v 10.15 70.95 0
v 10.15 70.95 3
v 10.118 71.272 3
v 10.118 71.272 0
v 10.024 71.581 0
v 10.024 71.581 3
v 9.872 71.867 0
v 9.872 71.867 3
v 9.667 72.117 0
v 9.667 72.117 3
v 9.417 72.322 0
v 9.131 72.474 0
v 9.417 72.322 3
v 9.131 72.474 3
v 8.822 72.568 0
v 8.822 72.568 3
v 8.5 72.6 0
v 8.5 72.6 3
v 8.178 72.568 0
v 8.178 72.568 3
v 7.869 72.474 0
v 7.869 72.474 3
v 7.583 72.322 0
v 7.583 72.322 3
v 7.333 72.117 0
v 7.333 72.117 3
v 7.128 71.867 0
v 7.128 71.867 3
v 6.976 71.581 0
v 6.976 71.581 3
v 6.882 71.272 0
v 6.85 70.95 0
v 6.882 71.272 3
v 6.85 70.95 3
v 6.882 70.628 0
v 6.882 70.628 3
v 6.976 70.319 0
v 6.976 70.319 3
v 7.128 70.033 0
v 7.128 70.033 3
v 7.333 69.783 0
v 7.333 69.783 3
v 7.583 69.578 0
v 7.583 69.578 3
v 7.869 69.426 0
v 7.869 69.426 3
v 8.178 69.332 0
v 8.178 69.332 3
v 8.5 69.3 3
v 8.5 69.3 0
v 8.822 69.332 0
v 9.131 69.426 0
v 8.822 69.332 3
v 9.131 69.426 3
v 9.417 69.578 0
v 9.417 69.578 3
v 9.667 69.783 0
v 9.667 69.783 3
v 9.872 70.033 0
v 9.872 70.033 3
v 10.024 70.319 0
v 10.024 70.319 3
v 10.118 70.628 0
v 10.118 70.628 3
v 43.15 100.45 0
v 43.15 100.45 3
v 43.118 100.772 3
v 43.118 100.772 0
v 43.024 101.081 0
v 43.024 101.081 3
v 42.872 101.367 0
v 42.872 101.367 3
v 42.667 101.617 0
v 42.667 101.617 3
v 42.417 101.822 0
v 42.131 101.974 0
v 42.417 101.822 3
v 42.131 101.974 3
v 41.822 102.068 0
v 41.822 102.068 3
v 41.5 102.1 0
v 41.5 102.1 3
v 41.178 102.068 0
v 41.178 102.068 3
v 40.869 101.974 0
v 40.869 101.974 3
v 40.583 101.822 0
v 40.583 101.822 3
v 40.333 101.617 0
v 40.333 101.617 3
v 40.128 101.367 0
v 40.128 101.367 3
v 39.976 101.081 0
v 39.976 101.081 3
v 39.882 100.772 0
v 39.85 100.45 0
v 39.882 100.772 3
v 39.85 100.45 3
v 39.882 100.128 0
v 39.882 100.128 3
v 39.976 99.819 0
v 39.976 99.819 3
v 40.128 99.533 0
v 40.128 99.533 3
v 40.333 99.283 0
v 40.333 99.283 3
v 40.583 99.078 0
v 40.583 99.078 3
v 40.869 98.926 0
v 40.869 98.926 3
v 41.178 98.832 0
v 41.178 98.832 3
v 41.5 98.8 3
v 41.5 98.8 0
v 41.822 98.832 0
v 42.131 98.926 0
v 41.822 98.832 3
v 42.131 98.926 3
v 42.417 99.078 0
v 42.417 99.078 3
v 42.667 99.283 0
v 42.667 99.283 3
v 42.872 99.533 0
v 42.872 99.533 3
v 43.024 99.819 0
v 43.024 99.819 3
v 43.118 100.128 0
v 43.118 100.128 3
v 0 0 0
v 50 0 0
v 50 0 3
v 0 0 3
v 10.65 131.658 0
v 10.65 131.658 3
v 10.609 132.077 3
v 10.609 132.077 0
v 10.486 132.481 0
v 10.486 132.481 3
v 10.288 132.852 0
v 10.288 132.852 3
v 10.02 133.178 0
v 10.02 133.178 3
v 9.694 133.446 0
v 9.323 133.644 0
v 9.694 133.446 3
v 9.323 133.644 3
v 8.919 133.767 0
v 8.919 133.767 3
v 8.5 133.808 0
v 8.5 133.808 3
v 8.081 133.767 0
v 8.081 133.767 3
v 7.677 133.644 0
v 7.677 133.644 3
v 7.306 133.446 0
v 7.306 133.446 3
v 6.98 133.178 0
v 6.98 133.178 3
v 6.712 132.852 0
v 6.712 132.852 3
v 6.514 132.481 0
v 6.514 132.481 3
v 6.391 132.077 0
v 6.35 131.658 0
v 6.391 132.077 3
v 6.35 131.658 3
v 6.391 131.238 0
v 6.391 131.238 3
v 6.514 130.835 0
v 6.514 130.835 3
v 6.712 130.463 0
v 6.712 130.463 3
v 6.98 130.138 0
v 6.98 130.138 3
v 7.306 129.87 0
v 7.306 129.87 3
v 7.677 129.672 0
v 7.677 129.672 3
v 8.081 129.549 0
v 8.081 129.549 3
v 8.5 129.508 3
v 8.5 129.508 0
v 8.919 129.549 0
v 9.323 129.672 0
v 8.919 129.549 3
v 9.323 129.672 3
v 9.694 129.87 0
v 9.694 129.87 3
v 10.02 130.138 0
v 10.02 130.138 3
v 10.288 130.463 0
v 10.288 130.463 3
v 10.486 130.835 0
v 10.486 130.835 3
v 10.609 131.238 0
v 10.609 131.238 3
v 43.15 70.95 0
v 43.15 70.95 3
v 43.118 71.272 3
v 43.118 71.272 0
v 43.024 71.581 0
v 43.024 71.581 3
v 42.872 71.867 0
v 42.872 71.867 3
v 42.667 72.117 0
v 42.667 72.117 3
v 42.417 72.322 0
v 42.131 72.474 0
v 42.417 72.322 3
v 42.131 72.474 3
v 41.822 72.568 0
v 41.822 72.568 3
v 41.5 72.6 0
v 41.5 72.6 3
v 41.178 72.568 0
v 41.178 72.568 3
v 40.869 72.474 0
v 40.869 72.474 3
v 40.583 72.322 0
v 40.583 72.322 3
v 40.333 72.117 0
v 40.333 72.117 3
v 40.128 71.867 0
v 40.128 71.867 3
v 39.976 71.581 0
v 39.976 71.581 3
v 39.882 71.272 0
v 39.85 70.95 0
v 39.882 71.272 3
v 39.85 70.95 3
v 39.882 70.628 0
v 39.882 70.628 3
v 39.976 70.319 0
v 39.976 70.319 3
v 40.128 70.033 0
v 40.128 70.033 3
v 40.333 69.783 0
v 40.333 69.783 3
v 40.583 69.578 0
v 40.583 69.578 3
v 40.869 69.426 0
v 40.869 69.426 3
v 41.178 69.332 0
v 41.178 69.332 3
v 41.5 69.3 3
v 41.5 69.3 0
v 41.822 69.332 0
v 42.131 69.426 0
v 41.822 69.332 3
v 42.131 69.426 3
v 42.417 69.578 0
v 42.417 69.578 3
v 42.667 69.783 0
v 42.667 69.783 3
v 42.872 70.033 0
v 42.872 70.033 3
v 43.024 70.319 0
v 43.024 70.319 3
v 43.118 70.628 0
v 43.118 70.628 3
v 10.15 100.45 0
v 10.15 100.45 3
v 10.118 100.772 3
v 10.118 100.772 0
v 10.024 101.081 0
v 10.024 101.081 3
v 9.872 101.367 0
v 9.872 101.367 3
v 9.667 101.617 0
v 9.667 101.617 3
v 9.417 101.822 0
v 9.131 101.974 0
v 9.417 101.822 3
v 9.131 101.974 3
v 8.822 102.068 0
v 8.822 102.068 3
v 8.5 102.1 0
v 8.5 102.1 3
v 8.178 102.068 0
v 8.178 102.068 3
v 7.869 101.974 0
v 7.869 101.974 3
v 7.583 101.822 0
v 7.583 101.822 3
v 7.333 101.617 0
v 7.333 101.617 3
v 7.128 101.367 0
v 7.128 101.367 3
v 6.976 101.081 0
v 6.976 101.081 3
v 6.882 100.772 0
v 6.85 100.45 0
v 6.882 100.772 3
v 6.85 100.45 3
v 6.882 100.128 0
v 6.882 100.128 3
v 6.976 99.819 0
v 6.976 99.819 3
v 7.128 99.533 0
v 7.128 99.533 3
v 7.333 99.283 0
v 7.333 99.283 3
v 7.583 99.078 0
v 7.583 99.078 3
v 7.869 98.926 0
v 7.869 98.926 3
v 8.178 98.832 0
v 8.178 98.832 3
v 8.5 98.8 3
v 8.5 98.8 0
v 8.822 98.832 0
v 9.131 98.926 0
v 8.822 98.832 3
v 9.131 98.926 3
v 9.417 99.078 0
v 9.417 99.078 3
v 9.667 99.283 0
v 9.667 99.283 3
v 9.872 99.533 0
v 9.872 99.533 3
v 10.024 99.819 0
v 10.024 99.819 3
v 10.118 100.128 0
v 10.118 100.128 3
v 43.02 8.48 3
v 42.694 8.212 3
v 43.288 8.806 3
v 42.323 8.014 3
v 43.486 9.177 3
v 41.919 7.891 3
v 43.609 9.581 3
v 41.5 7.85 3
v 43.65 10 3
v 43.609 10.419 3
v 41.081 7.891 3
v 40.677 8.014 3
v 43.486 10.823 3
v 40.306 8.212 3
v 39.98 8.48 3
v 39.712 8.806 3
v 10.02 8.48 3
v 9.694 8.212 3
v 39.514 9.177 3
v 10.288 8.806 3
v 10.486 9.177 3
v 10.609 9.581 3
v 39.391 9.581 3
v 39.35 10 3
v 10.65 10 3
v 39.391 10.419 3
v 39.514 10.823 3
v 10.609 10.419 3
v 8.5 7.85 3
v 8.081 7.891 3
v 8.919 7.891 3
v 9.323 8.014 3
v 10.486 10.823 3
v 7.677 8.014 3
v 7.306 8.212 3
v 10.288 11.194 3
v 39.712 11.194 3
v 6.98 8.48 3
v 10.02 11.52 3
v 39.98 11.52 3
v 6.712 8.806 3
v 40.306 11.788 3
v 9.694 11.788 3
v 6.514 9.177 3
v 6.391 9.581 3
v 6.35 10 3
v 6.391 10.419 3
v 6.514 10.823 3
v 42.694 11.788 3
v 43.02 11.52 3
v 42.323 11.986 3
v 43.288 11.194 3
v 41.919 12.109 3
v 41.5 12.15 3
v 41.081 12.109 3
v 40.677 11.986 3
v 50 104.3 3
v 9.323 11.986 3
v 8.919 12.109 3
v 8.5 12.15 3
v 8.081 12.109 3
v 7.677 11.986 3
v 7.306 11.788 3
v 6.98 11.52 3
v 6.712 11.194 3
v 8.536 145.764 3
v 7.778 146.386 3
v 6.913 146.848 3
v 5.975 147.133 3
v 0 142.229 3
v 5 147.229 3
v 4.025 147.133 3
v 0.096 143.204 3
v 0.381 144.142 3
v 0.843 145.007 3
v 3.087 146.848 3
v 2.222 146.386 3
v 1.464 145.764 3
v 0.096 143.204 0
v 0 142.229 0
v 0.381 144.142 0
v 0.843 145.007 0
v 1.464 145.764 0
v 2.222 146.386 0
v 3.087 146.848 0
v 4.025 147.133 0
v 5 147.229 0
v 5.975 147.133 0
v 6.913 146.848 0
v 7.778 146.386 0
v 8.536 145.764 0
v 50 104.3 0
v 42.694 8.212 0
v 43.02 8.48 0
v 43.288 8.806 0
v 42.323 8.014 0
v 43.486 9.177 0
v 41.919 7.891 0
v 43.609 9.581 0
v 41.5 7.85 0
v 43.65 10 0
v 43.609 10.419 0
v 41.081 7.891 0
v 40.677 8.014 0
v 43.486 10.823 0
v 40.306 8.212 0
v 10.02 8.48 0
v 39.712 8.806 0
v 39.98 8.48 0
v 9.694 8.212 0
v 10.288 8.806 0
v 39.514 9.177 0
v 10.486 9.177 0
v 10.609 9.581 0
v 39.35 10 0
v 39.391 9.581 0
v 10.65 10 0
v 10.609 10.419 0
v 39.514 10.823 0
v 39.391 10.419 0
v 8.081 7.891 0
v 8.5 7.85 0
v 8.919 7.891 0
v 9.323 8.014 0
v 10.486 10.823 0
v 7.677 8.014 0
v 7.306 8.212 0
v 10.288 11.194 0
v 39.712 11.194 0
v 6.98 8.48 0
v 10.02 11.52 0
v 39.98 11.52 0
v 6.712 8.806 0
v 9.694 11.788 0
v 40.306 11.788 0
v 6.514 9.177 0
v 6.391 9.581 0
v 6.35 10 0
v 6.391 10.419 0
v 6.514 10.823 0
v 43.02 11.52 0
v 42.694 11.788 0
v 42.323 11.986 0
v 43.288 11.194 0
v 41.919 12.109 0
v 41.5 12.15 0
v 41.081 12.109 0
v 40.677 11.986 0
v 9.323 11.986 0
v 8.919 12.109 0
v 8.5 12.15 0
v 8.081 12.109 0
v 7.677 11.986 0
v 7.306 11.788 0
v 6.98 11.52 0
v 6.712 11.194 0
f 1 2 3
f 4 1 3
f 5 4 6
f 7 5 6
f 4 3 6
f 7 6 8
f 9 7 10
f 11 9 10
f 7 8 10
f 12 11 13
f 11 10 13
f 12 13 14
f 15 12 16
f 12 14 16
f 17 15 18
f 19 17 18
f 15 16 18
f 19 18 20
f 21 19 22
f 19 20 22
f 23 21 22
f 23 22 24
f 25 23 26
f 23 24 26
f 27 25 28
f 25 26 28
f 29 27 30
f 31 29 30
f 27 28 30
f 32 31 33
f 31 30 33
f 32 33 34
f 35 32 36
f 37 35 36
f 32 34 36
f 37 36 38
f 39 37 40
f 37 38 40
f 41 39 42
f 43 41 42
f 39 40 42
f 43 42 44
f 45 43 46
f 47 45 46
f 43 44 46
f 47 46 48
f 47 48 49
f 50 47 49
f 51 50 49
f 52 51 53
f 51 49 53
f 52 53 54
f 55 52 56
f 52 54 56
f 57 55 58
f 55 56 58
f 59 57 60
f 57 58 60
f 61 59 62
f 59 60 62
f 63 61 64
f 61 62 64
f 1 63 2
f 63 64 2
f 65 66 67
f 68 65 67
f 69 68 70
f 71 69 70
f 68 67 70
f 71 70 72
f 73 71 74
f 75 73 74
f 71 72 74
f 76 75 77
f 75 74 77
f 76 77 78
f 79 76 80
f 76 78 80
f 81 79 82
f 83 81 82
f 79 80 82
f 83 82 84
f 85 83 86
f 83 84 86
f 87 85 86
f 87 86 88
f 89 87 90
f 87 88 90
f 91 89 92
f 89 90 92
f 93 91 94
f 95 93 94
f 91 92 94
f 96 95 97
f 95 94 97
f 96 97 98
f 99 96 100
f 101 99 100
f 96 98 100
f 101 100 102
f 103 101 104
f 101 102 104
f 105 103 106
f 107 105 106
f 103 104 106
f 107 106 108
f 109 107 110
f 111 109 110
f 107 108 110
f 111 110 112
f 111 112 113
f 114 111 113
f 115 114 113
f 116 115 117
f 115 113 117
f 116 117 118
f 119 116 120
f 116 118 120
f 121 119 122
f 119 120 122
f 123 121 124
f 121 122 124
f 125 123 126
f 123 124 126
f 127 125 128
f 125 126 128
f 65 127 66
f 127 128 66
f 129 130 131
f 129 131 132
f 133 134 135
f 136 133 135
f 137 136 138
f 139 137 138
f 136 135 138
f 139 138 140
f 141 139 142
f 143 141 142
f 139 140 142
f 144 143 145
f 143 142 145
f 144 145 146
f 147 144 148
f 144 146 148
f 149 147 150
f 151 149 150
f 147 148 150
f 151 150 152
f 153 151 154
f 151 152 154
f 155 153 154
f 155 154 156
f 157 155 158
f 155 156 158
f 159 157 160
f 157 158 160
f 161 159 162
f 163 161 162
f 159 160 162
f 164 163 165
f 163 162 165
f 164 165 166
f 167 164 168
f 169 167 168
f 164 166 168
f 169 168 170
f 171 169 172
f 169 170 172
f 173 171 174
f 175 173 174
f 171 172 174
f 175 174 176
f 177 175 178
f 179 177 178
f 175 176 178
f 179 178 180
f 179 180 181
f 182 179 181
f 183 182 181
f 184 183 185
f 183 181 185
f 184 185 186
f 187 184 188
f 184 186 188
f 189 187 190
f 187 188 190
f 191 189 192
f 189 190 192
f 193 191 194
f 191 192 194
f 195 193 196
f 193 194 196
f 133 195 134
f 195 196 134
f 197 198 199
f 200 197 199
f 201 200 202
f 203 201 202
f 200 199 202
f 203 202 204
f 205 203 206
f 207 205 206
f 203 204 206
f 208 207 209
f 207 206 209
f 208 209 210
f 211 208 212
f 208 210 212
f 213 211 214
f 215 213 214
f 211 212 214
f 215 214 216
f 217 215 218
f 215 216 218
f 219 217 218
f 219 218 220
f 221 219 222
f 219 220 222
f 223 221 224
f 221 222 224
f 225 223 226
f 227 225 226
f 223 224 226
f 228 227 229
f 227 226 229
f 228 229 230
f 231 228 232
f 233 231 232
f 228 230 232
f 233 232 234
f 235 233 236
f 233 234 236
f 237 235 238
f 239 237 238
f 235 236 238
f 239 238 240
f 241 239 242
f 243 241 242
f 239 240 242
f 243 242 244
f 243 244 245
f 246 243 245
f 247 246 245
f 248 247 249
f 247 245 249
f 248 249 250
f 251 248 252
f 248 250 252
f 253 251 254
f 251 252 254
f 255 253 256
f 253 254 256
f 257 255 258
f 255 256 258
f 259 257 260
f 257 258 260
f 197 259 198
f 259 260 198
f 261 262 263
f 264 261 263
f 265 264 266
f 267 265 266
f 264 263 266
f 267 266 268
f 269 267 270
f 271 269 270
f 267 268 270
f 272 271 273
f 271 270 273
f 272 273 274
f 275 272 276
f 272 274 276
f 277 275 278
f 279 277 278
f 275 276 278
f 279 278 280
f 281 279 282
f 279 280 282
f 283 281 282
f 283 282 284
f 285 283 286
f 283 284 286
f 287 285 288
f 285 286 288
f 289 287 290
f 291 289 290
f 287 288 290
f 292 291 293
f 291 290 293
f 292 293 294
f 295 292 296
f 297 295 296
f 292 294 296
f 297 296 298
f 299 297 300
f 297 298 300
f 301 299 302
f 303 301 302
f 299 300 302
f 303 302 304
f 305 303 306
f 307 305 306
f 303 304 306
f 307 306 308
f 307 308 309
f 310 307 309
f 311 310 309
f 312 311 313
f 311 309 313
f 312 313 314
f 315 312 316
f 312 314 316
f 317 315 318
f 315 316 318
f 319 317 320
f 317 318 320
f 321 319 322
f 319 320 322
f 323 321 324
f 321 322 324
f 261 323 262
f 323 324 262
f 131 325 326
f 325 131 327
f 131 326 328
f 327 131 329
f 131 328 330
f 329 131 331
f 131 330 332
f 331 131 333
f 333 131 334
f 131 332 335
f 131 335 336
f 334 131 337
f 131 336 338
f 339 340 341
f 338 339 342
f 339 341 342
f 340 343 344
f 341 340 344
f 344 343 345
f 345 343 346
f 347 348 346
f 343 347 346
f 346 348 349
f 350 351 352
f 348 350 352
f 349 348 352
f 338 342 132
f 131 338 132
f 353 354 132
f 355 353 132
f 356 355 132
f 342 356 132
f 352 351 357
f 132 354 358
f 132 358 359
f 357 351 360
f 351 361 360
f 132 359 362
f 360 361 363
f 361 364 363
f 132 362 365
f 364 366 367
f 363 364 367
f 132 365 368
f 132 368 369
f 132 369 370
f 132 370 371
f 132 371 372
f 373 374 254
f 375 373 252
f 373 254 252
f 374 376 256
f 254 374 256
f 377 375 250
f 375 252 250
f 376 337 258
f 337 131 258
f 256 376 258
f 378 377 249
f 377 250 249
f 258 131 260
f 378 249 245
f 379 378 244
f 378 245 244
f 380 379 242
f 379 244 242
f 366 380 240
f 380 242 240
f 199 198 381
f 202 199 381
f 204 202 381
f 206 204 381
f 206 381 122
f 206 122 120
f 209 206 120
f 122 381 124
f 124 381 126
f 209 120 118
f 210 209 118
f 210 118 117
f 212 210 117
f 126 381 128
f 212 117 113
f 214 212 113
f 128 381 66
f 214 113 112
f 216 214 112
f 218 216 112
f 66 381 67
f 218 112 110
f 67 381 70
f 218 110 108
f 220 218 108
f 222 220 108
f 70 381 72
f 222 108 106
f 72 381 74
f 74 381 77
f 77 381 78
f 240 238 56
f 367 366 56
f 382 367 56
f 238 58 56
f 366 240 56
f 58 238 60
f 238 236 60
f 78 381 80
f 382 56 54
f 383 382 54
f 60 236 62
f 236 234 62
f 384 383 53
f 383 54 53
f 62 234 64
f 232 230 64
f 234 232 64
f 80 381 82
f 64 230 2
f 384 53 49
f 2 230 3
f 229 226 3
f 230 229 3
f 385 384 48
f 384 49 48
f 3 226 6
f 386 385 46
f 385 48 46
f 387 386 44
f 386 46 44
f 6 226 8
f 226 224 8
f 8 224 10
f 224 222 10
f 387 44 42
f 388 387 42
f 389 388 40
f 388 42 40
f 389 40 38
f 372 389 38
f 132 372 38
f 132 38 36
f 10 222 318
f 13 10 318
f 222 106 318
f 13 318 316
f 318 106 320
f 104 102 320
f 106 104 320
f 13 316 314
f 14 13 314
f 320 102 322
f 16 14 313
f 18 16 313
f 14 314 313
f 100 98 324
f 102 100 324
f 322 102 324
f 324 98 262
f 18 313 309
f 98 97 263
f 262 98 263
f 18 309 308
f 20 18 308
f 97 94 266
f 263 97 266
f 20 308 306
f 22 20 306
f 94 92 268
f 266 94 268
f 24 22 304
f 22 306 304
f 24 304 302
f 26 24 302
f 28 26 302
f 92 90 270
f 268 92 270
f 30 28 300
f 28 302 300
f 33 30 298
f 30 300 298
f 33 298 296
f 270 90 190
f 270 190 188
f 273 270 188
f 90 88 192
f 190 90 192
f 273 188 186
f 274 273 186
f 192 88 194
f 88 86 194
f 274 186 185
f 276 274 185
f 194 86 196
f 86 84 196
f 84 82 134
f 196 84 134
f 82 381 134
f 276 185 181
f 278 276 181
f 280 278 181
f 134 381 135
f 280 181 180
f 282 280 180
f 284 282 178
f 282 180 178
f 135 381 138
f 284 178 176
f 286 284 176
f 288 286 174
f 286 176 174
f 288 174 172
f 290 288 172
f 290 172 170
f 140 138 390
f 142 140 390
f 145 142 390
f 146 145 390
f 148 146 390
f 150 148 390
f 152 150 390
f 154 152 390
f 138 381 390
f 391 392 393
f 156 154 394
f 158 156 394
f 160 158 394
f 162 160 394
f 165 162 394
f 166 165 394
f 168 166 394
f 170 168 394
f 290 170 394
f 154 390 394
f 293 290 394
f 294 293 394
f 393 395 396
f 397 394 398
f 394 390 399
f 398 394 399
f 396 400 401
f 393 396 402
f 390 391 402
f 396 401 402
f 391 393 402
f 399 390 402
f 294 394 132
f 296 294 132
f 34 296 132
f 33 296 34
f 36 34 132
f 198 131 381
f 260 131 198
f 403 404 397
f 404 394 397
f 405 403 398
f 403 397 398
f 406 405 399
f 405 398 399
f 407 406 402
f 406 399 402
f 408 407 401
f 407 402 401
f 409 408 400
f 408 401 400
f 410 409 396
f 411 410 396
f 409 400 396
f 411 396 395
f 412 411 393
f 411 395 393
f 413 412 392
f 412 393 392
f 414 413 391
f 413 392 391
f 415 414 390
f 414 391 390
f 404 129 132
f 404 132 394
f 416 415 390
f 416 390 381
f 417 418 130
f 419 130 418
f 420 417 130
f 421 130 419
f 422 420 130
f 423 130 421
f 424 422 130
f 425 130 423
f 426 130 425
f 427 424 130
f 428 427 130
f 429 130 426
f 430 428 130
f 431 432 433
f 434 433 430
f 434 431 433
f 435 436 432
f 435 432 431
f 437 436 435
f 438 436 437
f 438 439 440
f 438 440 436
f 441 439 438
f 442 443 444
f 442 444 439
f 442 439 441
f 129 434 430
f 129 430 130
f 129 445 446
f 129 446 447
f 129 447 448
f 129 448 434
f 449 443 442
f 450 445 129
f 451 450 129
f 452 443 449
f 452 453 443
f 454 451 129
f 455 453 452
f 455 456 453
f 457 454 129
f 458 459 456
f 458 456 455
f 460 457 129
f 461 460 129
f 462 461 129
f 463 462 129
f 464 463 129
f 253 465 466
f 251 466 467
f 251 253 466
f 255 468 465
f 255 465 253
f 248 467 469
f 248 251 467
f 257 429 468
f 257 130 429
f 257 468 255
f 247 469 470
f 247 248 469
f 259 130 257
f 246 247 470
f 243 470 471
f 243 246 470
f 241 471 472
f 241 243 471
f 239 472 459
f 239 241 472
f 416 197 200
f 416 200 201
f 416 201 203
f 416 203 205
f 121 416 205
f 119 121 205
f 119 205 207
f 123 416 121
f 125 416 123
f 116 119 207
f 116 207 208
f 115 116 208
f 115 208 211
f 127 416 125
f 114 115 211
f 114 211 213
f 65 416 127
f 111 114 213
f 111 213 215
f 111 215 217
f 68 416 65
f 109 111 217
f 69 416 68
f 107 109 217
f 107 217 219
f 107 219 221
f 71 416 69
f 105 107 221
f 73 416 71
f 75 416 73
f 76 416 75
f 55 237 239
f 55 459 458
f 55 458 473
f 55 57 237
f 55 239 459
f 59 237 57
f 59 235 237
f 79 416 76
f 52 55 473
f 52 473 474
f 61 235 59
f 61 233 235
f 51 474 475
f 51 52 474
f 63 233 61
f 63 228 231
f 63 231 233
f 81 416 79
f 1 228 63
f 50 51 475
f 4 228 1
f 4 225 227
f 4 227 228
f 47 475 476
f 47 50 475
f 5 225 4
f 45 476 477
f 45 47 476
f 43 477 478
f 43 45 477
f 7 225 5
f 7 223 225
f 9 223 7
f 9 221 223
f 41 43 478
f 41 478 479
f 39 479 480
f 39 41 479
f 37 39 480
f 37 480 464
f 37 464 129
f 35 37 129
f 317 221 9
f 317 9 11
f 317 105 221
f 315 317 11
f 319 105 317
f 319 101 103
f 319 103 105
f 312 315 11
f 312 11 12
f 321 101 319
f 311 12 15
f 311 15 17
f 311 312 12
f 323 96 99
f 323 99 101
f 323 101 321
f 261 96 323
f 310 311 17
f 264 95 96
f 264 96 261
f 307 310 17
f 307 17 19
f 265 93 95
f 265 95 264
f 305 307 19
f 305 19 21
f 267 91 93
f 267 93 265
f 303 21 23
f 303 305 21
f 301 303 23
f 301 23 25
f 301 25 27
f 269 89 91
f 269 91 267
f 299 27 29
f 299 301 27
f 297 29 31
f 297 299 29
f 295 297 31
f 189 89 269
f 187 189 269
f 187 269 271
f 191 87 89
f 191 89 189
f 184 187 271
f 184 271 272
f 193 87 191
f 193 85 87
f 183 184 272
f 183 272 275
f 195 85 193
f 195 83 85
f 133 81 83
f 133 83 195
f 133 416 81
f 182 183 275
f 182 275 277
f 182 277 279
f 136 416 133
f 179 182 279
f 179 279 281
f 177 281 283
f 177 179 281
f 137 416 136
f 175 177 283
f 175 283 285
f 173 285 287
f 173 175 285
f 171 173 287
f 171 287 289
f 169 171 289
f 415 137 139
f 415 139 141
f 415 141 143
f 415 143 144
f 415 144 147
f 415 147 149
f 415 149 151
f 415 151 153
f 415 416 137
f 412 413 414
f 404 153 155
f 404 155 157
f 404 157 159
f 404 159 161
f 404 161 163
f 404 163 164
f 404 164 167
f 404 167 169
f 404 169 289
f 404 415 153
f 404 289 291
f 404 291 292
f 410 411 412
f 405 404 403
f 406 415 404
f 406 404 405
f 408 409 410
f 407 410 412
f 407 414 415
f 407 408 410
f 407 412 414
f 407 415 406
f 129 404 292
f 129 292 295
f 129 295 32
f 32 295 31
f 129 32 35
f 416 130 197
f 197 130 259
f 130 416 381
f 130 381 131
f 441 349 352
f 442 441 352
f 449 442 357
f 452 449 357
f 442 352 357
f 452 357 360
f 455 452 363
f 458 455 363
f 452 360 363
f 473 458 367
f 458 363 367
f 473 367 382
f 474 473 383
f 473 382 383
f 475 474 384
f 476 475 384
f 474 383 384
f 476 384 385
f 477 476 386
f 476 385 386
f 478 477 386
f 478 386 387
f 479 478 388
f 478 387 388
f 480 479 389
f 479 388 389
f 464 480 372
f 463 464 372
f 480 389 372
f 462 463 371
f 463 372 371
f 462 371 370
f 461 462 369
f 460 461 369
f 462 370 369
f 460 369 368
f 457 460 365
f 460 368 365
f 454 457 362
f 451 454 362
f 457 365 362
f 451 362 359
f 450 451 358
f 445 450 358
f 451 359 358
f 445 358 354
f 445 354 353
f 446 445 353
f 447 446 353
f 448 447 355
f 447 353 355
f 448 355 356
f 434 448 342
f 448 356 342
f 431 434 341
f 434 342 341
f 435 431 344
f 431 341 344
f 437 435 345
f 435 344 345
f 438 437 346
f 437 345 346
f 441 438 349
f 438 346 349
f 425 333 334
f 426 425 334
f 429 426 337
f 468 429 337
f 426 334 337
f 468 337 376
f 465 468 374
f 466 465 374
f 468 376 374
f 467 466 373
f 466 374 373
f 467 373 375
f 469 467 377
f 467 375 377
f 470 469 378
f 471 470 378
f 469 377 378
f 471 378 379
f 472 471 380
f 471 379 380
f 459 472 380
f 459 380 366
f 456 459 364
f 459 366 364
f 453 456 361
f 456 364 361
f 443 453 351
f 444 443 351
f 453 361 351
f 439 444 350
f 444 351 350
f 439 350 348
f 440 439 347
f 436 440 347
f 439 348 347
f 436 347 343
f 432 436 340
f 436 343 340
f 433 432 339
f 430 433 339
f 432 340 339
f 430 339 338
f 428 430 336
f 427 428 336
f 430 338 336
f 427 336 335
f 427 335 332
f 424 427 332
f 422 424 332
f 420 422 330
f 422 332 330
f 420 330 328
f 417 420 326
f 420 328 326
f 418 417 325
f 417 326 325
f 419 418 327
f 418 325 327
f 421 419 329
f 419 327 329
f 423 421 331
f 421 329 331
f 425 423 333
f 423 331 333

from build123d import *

# Parameters (mm, degrees)
EXTRUDE_1_DEPTH     = 3
SKETCH_2_R          = 2.15
SKETCH_2_R_2        = 1.65
CUT_EXTRUDE_1_DEPTH = 3
FILLET_1_R          = 5


with BuildPart() as part:
    # 草图1 → 凸台-拉伸1 (new body)
    with BuildSketch(Plane.XY):
        Polygon((0, 0), (0, 154.3), (50, 104.3), (50, 0), align=None)
    extrude(amount=EXTRUDE_1_DEPTH)

    # 草图2 → 切除-拉伸1 (cut)
    with BuildSketch(Plane.XY.offset(3)):
        with Locations((8.5, 10)):
            Circle(SKETCH_2_R)
        with Locations((41.5, 10)):
            Circle(SKETCH_2_R)
        with Locations((8.5, 131.657864376)):
            Circle(SKETCH_2_R)
        with Locations((8.5, 100.45)):
            Circle(SKETCH_2_R_2)
        with Locations((8.5, 70.95)):
            Circle(SKETCH_2_R_2)
        with Locations((41.5, 70.95)):
            Circle(SKETCH_2_R_2)
        with Locations((41.5, 100.45)):
            Circle(SKETCH_2_R_2)
    extrude(amount=-CUT_EXTRUDE_1_DEPTH, mode=Mode.SUBTRACT)

    # 圆角1
    fillet_1_edges = [part.edges().sort_by_distance(p)[0] for p in [
        (0, 154.3, 1.5),
    ]]
    fillet(fillet_1_edges, radius=FILLET_1_R)


solid = part.part
